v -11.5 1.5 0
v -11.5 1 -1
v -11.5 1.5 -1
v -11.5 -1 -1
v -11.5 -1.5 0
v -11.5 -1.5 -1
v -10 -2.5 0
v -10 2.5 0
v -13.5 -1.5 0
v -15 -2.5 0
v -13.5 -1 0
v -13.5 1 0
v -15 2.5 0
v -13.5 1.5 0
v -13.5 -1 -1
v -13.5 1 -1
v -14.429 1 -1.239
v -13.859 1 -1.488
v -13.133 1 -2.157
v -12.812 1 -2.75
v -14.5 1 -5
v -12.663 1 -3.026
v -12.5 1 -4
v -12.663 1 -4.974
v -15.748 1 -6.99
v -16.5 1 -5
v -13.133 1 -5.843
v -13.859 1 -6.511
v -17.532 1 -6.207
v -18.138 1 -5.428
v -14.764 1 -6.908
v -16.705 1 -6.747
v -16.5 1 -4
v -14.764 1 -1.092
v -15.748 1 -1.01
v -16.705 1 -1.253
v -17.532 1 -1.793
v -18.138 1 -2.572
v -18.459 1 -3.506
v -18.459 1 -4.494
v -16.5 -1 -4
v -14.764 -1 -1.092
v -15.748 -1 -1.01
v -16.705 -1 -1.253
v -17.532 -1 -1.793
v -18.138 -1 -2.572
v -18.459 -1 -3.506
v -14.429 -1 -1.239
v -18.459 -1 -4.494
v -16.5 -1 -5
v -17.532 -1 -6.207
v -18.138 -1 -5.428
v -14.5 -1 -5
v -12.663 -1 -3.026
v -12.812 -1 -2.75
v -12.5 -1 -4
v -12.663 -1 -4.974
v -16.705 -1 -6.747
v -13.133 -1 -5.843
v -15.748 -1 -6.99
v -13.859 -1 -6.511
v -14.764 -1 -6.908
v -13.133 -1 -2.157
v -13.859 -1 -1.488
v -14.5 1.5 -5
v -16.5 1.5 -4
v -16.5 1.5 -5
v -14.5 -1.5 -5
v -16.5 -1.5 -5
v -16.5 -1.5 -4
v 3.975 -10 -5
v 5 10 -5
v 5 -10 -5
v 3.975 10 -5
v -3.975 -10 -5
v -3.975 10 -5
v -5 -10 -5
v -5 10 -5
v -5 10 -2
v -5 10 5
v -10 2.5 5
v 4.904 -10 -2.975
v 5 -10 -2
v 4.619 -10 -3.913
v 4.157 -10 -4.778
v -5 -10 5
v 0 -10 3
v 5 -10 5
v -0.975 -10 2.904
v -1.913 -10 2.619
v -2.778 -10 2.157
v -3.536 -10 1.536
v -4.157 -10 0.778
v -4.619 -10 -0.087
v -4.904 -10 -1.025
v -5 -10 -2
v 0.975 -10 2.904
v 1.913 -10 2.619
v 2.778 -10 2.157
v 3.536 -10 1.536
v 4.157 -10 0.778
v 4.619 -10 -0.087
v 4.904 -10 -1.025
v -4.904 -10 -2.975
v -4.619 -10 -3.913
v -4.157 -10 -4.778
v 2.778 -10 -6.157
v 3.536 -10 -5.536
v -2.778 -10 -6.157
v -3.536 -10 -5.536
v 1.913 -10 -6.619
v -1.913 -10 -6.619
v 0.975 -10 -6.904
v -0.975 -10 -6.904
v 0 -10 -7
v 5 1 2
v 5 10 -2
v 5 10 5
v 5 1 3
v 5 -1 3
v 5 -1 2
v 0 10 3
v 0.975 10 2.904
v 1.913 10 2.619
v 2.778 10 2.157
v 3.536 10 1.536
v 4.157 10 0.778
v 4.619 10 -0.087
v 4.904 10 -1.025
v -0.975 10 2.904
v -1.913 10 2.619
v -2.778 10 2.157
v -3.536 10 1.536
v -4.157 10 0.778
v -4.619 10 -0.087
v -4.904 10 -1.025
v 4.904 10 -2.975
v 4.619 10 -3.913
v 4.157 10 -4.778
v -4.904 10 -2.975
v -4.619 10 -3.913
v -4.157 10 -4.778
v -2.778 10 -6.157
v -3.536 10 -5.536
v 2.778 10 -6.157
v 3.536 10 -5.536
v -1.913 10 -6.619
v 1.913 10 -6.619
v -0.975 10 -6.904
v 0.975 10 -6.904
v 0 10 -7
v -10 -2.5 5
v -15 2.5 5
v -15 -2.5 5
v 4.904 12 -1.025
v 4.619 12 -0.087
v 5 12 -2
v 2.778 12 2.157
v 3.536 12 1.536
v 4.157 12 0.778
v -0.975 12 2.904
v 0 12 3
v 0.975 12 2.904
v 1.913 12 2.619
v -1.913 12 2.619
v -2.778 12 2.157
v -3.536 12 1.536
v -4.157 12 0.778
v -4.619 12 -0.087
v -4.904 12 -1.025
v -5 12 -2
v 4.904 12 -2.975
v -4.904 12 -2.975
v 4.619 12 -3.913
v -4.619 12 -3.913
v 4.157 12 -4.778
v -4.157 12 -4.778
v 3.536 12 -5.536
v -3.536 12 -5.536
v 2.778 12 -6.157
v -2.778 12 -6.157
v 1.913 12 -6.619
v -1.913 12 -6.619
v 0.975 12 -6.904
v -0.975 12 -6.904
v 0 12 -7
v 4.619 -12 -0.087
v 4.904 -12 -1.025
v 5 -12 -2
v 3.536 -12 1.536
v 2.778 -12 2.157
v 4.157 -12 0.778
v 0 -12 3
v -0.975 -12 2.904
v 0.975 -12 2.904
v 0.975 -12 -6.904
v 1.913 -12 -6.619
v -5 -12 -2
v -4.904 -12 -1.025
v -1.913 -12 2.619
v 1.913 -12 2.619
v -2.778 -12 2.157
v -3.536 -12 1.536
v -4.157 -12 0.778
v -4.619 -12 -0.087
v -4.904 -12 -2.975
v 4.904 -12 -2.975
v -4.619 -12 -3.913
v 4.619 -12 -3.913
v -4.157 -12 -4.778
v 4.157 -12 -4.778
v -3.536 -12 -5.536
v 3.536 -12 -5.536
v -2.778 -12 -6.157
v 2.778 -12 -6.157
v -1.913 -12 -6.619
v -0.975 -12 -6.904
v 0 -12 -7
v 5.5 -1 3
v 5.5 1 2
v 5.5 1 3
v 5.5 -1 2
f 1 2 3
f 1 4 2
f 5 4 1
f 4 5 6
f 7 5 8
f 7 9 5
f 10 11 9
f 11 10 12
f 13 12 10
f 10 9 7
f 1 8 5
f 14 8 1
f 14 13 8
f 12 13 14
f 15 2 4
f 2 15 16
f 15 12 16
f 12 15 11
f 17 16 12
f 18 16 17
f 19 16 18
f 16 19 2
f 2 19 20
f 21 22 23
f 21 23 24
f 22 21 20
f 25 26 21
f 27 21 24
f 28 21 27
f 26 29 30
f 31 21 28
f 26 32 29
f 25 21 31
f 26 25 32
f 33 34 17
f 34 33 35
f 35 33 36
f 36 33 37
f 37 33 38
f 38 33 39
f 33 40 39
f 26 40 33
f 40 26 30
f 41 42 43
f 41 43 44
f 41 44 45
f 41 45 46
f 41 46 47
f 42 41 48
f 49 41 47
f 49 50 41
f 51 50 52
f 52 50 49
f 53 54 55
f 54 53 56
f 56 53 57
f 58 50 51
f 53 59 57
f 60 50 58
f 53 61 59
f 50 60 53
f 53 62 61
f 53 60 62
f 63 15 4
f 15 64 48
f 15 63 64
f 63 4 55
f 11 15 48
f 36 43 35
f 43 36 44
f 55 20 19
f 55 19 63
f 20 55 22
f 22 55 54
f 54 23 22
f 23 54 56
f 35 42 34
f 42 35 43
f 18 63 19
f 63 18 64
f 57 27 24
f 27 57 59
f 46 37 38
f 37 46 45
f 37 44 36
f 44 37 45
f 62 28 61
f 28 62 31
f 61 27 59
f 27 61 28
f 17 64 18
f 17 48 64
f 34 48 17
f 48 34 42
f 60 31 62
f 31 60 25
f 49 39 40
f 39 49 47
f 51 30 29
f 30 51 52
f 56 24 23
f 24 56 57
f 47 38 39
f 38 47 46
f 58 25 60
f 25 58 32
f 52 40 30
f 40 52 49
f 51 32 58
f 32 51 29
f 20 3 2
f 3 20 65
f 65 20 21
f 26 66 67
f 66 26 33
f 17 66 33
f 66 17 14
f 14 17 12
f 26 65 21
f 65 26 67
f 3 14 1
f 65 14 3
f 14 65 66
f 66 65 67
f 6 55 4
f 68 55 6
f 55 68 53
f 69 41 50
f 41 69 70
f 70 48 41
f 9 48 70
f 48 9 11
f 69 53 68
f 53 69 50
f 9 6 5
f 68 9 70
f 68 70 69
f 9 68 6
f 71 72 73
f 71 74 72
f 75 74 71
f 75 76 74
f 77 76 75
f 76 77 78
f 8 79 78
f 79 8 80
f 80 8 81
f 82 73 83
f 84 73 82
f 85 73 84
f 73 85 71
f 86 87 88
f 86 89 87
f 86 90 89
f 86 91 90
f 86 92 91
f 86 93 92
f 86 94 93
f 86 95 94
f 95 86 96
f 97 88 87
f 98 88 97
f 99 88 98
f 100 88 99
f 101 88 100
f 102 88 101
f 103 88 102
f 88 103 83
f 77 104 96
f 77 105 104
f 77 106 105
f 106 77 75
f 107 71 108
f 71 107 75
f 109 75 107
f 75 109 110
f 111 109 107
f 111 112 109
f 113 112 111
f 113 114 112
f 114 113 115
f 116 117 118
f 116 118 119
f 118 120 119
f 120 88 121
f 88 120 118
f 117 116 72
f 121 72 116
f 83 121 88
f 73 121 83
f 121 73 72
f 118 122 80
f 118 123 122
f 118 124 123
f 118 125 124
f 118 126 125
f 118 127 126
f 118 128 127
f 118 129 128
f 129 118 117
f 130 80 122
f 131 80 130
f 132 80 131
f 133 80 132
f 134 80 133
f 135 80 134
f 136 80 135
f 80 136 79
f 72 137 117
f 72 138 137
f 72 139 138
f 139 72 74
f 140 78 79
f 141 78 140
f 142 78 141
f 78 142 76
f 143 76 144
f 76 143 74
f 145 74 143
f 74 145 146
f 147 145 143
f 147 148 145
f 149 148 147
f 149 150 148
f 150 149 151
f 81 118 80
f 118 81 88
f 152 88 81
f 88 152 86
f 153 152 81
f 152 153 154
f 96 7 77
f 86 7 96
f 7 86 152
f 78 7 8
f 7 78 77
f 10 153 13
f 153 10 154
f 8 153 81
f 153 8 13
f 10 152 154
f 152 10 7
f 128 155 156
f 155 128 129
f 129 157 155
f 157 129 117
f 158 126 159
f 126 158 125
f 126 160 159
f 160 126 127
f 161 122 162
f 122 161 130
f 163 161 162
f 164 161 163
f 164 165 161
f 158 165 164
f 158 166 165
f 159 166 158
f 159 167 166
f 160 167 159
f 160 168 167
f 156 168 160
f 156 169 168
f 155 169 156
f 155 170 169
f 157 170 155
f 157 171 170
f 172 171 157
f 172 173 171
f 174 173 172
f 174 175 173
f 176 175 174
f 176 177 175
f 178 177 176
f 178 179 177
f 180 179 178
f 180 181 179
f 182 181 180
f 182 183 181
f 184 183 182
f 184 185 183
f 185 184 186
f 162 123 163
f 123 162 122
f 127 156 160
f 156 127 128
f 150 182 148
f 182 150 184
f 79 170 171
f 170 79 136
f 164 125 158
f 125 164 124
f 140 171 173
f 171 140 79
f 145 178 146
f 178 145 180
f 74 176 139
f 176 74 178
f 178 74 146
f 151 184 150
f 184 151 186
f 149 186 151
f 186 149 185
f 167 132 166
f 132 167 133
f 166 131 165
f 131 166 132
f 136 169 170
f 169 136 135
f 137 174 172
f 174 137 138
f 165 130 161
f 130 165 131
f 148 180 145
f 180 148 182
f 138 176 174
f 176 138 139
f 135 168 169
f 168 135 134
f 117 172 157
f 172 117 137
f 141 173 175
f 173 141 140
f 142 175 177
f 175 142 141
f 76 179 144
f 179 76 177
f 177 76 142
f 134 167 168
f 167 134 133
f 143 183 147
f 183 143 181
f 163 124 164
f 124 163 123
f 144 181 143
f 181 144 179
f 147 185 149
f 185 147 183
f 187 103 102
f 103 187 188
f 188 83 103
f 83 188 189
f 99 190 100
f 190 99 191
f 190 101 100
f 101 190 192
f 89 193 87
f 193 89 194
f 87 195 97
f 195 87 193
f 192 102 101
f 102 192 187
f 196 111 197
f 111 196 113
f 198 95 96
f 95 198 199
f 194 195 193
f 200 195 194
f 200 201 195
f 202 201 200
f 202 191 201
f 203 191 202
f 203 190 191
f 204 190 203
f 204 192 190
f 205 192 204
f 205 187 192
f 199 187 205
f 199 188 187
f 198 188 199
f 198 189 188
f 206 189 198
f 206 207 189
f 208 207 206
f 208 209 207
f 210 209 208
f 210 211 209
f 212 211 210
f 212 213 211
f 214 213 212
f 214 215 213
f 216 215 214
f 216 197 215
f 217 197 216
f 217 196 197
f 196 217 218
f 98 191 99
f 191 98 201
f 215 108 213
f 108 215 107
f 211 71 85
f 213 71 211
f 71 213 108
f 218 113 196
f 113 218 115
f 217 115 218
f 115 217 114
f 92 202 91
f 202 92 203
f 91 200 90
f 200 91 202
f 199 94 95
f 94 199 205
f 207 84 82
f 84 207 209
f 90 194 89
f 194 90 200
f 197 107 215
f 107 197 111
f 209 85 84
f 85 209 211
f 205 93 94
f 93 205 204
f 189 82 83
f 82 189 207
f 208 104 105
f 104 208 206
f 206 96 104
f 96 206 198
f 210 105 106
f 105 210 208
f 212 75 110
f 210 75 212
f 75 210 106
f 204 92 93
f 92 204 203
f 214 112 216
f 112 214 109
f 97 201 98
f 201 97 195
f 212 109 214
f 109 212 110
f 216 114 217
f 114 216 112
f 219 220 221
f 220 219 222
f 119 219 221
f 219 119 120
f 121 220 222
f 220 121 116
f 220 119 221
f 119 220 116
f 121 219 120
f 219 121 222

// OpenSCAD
$fa = 4;
$fs = 1;

body();

module body() {
	union() {
		//frame
		hull() {
			centered_cube([10,20,10]);
			translate([-7.5,0,2.5]) centered_cube([5,5,5]);
		}
		translate([-12.5,0,2.5]) centered_cube([5,5,5]);
		//wheels
		translate([0,11,-2]) wheel(5,2);
		translate([0,-11,-2]) wheel(5,2);
		translate([-12.5,0,0]) castor_wheel(3,2,3,4);
		//sensor
		translate([5,0,2.5]) centered_cube([1,2,1]);
	}
}


module sensor(v) {
	centered_cube(v);
}

module wheel(radius = 5, width = 1) {
	translate([0, width/2,0]) rotate([90,0,0]) cylinder(r = radius, h = width);
}

module castor_wheel(radius = 5, width = 1, delta_x = 5, delta_z = 6) {
	translate([-width/2,-width/2,-1]) cube([width,width,1]);
	translate([-delta_x, 0,-delta_z]) wheel(radius, width);
	hull(){
		translate([-width/2,width/2,-1]) cube([width,0.5,1]);
		translate([-width/2-delta_x,width/2,-1-delta_z]) cube([width,0.5,1]);
	}
	hull(){
		translate([-width/2,-width/2-0.5,-1]) cube([width,0.5,1]);
		translate([-width/2-delta_x,-width/2-0.5,-1-delta_z]) cube([width,0.5,1]);
	}
}

//helper
module centered_cube(v) {
	translate(-v/2) cube(v);
}
